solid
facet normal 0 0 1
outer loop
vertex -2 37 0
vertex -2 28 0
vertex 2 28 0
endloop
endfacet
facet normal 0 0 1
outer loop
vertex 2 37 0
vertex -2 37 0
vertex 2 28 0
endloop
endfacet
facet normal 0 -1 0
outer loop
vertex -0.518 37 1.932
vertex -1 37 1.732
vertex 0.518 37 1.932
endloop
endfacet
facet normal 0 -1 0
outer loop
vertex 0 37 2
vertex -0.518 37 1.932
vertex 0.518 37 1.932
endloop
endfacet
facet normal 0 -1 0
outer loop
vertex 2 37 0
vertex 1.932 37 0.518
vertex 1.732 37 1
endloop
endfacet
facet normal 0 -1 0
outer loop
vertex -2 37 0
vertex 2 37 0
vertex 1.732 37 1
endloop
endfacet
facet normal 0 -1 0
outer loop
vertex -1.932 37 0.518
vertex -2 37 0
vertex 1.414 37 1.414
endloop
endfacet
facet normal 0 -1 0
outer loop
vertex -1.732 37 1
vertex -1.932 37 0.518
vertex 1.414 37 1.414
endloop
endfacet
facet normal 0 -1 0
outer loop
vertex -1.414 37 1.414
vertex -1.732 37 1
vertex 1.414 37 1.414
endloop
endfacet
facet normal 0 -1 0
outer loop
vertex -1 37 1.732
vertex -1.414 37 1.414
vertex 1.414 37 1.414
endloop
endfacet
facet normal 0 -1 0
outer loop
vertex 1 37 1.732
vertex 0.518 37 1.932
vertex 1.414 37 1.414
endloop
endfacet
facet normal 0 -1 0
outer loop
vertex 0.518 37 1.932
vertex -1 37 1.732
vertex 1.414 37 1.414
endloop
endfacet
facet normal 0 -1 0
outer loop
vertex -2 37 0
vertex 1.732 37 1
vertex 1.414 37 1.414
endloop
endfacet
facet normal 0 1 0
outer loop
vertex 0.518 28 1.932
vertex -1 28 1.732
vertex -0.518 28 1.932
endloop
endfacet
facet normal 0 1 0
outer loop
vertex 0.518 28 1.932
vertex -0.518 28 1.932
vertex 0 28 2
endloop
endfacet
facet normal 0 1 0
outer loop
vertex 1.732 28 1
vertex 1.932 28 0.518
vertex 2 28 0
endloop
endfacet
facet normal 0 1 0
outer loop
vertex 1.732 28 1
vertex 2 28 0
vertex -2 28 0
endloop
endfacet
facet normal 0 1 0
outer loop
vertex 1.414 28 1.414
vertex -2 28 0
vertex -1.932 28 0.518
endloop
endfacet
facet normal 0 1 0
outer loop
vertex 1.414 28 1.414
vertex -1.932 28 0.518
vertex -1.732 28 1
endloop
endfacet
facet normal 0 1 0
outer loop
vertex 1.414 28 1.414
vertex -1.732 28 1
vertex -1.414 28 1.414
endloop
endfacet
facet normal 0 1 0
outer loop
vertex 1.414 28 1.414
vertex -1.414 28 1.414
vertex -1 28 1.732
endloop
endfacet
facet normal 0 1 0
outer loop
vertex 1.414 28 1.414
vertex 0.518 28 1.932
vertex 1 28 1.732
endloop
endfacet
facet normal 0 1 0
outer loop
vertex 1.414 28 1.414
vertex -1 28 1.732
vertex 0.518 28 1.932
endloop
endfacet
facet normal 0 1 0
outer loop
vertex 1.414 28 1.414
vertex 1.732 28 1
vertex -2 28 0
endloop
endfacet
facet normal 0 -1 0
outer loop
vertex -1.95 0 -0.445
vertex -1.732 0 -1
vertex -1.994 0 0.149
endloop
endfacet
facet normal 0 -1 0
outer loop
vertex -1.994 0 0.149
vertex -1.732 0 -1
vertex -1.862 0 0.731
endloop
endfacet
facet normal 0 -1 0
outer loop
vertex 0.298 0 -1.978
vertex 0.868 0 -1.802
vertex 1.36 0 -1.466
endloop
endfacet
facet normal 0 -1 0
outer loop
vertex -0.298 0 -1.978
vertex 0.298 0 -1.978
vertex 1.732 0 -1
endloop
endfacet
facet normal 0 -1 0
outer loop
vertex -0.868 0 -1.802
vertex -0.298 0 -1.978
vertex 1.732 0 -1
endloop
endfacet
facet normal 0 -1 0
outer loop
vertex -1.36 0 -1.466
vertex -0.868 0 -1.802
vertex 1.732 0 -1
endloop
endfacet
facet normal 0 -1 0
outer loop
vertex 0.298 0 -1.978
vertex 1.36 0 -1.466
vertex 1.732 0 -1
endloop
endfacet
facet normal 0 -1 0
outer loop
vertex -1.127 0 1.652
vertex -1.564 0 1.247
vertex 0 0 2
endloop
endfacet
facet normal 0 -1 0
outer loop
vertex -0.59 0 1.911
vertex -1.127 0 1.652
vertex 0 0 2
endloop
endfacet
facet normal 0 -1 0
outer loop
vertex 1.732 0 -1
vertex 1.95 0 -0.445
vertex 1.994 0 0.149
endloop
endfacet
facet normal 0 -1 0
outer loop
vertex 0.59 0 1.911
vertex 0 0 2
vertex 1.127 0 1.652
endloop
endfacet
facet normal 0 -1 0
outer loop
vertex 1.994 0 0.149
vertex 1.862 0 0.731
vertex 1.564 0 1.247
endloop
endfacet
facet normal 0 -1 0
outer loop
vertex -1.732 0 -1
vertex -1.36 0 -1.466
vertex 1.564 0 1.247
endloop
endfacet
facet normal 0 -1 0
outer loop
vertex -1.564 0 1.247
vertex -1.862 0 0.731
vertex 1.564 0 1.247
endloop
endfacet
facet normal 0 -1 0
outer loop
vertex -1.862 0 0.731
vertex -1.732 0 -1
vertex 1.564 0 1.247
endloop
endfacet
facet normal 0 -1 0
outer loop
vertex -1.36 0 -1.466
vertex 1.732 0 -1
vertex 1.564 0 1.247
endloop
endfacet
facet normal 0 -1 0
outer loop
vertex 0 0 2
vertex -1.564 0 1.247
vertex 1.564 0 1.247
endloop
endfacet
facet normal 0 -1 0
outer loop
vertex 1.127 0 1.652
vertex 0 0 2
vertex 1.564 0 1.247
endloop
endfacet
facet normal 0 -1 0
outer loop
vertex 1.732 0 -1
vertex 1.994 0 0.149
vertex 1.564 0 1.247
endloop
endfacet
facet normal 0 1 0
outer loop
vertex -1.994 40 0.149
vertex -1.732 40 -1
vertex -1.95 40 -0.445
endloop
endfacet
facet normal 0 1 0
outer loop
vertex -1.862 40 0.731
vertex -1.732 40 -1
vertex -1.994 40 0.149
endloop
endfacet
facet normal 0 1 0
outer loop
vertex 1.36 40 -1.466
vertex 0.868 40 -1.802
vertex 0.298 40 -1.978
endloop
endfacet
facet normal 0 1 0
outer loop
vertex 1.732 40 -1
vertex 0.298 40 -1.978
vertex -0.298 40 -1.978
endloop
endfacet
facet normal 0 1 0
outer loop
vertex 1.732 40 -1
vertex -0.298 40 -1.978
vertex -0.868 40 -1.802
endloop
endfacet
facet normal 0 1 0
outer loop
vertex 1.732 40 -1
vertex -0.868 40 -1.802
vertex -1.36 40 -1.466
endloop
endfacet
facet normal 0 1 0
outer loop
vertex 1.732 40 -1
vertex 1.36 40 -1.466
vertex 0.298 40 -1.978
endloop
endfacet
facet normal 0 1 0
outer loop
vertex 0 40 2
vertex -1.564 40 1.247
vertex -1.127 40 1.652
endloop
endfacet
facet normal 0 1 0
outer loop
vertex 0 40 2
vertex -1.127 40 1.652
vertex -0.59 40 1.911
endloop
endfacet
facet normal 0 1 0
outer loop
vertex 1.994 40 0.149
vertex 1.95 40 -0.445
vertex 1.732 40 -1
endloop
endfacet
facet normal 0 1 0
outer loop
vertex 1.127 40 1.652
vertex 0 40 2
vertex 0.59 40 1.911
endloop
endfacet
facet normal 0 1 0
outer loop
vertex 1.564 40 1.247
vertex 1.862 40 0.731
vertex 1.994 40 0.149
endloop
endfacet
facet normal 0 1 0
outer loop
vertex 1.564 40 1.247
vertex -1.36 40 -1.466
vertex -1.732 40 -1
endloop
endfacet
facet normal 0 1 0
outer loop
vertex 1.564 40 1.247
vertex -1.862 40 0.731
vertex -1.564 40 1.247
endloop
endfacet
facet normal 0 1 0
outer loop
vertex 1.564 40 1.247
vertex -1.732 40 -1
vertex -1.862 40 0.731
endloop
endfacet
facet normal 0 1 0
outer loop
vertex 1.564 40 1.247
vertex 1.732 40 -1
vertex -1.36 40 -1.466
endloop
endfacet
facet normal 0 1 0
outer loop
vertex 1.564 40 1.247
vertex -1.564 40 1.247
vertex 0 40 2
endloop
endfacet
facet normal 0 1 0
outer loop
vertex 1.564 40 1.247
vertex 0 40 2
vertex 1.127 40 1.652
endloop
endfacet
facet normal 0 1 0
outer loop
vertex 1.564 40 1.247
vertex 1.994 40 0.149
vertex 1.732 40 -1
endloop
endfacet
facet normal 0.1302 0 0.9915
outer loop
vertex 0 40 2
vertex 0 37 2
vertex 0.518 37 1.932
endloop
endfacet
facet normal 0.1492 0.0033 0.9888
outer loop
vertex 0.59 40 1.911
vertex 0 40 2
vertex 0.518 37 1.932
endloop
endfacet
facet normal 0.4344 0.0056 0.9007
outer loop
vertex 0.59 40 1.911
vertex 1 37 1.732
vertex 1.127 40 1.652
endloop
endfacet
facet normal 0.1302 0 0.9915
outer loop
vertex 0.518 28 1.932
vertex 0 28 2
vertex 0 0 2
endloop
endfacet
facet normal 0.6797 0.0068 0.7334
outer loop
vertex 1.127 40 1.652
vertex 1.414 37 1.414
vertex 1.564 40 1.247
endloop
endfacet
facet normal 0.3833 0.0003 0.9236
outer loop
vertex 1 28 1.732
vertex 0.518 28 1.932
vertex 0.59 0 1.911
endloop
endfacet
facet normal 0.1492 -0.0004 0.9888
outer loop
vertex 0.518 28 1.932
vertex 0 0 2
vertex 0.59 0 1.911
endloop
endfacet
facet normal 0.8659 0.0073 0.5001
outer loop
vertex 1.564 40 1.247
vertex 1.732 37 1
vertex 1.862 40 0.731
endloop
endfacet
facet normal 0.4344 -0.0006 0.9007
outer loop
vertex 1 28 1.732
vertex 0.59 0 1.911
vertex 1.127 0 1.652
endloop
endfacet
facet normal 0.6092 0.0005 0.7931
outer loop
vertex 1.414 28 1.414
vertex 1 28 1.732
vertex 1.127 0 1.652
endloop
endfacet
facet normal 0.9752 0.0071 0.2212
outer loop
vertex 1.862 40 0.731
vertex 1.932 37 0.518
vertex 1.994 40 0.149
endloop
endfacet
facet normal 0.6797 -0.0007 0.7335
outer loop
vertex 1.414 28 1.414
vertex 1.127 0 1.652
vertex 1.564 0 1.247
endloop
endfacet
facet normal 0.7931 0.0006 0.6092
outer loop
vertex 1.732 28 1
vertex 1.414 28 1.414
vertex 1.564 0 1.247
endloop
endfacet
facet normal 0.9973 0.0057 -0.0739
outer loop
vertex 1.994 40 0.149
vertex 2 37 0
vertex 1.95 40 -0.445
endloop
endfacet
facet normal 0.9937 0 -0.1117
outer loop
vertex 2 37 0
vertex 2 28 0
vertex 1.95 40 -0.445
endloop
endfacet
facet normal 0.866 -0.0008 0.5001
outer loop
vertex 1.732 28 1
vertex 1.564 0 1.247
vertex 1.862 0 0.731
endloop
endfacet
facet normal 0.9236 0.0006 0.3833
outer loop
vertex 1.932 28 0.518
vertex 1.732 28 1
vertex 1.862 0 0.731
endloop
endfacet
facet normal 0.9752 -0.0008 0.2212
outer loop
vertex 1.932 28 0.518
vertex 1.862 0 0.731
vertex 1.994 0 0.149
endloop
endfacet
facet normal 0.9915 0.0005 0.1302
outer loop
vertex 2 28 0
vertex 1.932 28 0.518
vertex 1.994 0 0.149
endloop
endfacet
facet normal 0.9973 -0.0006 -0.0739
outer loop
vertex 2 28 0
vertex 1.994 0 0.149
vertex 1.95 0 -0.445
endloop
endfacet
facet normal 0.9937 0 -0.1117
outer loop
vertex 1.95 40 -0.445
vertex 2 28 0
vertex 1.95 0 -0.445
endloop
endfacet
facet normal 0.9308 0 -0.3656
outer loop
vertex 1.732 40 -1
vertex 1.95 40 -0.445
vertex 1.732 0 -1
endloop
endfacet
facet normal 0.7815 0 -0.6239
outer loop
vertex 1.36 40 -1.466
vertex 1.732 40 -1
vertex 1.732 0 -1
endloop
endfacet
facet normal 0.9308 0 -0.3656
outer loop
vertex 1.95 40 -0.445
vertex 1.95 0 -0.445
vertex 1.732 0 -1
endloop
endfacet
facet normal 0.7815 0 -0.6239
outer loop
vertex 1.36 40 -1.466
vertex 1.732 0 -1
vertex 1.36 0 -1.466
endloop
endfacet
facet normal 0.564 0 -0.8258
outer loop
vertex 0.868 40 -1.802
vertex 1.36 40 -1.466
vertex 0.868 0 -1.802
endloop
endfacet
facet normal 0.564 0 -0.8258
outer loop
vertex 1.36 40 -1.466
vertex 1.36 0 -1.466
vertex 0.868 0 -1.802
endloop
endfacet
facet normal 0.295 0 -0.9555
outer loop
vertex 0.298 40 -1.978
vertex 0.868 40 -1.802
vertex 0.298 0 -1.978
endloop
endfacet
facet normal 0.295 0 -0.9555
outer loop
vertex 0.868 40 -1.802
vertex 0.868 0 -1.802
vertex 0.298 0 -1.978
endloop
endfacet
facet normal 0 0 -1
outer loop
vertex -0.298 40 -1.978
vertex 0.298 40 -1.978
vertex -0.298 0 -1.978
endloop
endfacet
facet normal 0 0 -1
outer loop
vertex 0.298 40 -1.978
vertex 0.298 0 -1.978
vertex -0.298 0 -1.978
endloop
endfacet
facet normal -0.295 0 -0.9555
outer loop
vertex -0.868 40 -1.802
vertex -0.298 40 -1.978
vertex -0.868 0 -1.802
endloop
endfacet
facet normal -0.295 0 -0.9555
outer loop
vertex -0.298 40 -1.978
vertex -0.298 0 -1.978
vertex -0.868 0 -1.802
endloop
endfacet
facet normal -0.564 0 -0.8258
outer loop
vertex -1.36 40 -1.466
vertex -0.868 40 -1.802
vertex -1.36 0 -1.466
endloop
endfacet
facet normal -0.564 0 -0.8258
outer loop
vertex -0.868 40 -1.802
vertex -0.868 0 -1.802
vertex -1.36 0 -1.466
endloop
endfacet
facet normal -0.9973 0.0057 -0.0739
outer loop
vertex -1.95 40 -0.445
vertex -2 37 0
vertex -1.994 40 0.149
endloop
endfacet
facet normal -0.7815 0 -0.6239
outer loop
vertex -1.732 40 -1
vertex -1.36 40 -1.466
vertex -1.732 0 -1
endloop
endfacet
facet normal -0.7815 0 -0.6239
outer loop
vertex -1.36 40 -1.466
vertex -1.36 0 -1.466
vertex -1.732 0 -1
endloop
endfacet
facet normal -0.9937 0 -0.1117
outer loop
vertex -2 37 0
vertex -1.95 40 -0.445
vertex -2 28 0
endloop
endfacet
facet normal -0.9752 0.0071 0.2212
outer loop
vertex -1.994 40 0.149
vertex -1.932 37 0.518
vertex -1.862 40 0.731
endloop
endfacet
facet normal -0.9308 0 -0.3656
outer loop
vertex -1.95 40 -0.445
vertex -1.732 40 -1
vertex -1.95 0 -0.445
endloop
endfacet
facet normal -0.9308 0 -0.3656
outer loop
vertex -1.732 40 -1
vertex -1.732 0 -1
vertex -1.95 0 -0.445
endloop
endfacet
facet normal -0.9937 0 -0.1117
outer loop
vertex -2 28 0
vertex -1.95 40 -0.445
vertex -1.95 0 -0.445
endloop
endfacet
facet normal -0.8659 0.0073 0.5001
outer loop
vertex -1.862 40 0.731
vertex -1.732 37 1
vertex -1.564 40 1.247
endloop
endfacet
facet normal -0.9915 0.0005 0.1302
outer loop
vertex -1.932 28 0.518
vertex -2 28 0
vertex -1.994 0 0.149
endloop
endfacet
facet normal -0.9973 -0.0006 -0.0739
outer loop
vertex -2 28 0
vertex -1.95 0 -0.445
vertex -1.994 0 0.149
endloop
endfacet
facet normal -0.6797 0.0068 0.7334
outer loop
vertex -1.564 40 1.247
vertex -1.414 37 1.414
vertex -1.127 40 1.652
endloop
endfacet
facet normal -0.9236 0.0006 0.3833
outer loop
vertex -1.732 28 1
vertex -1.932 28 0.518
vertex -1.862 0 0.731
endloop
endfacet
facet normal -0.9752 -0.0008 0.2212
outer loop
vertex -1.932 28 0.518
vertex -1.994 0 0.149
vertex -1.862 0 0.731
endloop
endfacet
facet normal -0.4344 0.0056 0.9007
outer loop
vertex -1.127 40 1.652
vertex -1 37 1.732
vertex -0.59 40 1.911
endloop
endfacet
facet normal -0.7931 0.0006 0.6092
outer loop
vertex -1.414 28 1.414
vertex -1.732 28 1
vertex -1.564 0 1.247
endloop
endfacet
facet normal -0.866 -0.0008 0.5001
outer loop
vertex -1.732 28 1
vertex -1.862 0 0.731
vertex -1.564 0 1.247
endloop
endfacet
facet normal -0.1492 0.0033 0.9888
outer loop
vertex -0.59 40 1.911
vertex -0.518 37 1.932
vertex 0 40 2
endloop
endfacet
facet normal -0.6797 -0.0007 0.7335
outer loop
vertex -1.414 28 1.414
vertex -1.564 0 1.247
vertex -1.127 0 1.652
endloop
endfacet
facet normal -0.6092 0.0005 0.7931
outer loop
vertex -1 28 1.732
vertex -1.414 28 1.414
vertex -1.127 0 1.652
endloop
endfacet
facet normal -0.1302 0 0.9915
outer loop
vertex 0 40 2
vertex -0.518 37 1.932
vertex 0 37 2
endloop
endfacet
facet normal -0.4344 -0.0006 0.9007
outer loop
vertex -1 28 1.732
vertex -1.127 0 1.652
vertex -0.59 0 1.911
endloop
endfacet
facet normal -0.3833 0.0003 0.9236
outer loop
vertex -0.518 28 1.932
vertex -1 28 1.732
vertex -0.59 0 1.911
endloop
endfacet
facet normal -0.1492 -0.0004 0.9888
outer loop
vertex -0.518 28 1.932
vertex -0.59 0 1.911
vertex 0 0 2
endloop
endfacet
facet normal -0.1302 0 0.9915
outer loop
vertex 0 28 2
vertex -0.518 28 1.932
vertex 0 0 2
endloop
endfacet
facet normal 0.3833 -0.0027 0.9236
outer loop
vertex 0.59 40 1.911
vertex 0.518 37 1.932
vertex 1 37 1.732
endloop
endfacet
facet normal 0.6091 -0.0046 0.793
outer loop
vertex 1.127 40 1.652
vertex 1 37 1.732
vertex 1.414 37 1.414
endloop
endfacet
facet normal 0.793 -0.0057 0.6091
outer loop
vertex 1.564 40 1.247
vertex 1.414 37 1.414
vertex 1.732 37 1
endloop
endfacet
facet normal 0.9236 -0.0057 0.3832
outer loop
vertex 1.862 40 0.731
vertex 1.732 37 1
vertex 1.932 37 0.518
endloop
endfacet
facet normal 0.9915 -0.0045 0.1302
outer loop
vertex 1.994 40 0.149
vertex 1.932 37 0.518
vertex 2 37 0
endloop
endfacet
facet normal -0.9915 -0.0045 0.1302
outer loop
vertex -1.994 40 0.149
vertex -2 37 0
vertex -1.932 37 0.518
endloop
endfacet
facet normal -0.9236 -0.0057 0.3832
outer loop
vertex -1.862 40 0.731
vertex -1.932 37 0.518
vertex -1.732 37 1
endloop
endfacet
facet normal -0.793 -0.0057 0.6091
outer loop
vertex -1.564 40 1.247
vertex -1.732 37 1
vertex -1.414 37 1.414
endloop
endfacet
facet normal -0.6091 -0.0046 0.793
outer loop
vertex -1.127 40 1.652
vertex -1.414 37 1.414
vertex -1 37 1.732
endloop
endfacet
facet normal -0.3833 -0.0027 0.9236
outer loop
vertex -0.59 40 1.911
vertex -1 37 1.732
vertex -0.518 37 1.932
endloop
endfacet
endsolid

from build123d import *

# Parameters (mm, degrees)
SKETCH1_R           = 2
BOSS_EXTRUDE1_DEPTH = 28
BOSS_EXTRUDE2_DEPTH = 9
SKETCH3_R           = 2
BOSS_EXTRUDE3_DEPTH = 3


with BuildPart() as part:
    # Sketch1 → Boss-Extrude1 (new body)
    with BuildSketch(Plane(origin=(0, 0, 0), x_dir=(1, 0, 0), z_dir=(0, 1, 0))):
        with Locations(Location((0, 0, 0), (0, 0, 270))):
            Circle(SKETCH1_R)
    extrude(amount=BOSS_EXTRUDE1_DEPTH)

    # Sketch2 → Boss-Extrude2 (add)
    with BuildSketch(Plane(origin=(0, 28, 0), x_dir=(1, 0, 0), z_dir=(0, 1, 0))):
        with BuildLine():
            Line((-2, 0), (2, 0))
            ThreePointArc((2, 0), (0, 2), (-2, 0))
        make_face()
    extrude(amount=BOSS_EXTRUDE2_DEPTH)

    # Sketch3 → Boss-Extrude3 (add)
    with BuildSketch(Plane(origin=(0, 37, 0), x_dir=(1, 0, 0), z_dir=(0, 1, 0))):
        with Locations(Location((0, 0, 0), (0, 0, 270))):
            Circle(SKETCH3_R)
    extrude(amount=BOSS_EXTRUDE3_DEPTH)


solid = part.part
